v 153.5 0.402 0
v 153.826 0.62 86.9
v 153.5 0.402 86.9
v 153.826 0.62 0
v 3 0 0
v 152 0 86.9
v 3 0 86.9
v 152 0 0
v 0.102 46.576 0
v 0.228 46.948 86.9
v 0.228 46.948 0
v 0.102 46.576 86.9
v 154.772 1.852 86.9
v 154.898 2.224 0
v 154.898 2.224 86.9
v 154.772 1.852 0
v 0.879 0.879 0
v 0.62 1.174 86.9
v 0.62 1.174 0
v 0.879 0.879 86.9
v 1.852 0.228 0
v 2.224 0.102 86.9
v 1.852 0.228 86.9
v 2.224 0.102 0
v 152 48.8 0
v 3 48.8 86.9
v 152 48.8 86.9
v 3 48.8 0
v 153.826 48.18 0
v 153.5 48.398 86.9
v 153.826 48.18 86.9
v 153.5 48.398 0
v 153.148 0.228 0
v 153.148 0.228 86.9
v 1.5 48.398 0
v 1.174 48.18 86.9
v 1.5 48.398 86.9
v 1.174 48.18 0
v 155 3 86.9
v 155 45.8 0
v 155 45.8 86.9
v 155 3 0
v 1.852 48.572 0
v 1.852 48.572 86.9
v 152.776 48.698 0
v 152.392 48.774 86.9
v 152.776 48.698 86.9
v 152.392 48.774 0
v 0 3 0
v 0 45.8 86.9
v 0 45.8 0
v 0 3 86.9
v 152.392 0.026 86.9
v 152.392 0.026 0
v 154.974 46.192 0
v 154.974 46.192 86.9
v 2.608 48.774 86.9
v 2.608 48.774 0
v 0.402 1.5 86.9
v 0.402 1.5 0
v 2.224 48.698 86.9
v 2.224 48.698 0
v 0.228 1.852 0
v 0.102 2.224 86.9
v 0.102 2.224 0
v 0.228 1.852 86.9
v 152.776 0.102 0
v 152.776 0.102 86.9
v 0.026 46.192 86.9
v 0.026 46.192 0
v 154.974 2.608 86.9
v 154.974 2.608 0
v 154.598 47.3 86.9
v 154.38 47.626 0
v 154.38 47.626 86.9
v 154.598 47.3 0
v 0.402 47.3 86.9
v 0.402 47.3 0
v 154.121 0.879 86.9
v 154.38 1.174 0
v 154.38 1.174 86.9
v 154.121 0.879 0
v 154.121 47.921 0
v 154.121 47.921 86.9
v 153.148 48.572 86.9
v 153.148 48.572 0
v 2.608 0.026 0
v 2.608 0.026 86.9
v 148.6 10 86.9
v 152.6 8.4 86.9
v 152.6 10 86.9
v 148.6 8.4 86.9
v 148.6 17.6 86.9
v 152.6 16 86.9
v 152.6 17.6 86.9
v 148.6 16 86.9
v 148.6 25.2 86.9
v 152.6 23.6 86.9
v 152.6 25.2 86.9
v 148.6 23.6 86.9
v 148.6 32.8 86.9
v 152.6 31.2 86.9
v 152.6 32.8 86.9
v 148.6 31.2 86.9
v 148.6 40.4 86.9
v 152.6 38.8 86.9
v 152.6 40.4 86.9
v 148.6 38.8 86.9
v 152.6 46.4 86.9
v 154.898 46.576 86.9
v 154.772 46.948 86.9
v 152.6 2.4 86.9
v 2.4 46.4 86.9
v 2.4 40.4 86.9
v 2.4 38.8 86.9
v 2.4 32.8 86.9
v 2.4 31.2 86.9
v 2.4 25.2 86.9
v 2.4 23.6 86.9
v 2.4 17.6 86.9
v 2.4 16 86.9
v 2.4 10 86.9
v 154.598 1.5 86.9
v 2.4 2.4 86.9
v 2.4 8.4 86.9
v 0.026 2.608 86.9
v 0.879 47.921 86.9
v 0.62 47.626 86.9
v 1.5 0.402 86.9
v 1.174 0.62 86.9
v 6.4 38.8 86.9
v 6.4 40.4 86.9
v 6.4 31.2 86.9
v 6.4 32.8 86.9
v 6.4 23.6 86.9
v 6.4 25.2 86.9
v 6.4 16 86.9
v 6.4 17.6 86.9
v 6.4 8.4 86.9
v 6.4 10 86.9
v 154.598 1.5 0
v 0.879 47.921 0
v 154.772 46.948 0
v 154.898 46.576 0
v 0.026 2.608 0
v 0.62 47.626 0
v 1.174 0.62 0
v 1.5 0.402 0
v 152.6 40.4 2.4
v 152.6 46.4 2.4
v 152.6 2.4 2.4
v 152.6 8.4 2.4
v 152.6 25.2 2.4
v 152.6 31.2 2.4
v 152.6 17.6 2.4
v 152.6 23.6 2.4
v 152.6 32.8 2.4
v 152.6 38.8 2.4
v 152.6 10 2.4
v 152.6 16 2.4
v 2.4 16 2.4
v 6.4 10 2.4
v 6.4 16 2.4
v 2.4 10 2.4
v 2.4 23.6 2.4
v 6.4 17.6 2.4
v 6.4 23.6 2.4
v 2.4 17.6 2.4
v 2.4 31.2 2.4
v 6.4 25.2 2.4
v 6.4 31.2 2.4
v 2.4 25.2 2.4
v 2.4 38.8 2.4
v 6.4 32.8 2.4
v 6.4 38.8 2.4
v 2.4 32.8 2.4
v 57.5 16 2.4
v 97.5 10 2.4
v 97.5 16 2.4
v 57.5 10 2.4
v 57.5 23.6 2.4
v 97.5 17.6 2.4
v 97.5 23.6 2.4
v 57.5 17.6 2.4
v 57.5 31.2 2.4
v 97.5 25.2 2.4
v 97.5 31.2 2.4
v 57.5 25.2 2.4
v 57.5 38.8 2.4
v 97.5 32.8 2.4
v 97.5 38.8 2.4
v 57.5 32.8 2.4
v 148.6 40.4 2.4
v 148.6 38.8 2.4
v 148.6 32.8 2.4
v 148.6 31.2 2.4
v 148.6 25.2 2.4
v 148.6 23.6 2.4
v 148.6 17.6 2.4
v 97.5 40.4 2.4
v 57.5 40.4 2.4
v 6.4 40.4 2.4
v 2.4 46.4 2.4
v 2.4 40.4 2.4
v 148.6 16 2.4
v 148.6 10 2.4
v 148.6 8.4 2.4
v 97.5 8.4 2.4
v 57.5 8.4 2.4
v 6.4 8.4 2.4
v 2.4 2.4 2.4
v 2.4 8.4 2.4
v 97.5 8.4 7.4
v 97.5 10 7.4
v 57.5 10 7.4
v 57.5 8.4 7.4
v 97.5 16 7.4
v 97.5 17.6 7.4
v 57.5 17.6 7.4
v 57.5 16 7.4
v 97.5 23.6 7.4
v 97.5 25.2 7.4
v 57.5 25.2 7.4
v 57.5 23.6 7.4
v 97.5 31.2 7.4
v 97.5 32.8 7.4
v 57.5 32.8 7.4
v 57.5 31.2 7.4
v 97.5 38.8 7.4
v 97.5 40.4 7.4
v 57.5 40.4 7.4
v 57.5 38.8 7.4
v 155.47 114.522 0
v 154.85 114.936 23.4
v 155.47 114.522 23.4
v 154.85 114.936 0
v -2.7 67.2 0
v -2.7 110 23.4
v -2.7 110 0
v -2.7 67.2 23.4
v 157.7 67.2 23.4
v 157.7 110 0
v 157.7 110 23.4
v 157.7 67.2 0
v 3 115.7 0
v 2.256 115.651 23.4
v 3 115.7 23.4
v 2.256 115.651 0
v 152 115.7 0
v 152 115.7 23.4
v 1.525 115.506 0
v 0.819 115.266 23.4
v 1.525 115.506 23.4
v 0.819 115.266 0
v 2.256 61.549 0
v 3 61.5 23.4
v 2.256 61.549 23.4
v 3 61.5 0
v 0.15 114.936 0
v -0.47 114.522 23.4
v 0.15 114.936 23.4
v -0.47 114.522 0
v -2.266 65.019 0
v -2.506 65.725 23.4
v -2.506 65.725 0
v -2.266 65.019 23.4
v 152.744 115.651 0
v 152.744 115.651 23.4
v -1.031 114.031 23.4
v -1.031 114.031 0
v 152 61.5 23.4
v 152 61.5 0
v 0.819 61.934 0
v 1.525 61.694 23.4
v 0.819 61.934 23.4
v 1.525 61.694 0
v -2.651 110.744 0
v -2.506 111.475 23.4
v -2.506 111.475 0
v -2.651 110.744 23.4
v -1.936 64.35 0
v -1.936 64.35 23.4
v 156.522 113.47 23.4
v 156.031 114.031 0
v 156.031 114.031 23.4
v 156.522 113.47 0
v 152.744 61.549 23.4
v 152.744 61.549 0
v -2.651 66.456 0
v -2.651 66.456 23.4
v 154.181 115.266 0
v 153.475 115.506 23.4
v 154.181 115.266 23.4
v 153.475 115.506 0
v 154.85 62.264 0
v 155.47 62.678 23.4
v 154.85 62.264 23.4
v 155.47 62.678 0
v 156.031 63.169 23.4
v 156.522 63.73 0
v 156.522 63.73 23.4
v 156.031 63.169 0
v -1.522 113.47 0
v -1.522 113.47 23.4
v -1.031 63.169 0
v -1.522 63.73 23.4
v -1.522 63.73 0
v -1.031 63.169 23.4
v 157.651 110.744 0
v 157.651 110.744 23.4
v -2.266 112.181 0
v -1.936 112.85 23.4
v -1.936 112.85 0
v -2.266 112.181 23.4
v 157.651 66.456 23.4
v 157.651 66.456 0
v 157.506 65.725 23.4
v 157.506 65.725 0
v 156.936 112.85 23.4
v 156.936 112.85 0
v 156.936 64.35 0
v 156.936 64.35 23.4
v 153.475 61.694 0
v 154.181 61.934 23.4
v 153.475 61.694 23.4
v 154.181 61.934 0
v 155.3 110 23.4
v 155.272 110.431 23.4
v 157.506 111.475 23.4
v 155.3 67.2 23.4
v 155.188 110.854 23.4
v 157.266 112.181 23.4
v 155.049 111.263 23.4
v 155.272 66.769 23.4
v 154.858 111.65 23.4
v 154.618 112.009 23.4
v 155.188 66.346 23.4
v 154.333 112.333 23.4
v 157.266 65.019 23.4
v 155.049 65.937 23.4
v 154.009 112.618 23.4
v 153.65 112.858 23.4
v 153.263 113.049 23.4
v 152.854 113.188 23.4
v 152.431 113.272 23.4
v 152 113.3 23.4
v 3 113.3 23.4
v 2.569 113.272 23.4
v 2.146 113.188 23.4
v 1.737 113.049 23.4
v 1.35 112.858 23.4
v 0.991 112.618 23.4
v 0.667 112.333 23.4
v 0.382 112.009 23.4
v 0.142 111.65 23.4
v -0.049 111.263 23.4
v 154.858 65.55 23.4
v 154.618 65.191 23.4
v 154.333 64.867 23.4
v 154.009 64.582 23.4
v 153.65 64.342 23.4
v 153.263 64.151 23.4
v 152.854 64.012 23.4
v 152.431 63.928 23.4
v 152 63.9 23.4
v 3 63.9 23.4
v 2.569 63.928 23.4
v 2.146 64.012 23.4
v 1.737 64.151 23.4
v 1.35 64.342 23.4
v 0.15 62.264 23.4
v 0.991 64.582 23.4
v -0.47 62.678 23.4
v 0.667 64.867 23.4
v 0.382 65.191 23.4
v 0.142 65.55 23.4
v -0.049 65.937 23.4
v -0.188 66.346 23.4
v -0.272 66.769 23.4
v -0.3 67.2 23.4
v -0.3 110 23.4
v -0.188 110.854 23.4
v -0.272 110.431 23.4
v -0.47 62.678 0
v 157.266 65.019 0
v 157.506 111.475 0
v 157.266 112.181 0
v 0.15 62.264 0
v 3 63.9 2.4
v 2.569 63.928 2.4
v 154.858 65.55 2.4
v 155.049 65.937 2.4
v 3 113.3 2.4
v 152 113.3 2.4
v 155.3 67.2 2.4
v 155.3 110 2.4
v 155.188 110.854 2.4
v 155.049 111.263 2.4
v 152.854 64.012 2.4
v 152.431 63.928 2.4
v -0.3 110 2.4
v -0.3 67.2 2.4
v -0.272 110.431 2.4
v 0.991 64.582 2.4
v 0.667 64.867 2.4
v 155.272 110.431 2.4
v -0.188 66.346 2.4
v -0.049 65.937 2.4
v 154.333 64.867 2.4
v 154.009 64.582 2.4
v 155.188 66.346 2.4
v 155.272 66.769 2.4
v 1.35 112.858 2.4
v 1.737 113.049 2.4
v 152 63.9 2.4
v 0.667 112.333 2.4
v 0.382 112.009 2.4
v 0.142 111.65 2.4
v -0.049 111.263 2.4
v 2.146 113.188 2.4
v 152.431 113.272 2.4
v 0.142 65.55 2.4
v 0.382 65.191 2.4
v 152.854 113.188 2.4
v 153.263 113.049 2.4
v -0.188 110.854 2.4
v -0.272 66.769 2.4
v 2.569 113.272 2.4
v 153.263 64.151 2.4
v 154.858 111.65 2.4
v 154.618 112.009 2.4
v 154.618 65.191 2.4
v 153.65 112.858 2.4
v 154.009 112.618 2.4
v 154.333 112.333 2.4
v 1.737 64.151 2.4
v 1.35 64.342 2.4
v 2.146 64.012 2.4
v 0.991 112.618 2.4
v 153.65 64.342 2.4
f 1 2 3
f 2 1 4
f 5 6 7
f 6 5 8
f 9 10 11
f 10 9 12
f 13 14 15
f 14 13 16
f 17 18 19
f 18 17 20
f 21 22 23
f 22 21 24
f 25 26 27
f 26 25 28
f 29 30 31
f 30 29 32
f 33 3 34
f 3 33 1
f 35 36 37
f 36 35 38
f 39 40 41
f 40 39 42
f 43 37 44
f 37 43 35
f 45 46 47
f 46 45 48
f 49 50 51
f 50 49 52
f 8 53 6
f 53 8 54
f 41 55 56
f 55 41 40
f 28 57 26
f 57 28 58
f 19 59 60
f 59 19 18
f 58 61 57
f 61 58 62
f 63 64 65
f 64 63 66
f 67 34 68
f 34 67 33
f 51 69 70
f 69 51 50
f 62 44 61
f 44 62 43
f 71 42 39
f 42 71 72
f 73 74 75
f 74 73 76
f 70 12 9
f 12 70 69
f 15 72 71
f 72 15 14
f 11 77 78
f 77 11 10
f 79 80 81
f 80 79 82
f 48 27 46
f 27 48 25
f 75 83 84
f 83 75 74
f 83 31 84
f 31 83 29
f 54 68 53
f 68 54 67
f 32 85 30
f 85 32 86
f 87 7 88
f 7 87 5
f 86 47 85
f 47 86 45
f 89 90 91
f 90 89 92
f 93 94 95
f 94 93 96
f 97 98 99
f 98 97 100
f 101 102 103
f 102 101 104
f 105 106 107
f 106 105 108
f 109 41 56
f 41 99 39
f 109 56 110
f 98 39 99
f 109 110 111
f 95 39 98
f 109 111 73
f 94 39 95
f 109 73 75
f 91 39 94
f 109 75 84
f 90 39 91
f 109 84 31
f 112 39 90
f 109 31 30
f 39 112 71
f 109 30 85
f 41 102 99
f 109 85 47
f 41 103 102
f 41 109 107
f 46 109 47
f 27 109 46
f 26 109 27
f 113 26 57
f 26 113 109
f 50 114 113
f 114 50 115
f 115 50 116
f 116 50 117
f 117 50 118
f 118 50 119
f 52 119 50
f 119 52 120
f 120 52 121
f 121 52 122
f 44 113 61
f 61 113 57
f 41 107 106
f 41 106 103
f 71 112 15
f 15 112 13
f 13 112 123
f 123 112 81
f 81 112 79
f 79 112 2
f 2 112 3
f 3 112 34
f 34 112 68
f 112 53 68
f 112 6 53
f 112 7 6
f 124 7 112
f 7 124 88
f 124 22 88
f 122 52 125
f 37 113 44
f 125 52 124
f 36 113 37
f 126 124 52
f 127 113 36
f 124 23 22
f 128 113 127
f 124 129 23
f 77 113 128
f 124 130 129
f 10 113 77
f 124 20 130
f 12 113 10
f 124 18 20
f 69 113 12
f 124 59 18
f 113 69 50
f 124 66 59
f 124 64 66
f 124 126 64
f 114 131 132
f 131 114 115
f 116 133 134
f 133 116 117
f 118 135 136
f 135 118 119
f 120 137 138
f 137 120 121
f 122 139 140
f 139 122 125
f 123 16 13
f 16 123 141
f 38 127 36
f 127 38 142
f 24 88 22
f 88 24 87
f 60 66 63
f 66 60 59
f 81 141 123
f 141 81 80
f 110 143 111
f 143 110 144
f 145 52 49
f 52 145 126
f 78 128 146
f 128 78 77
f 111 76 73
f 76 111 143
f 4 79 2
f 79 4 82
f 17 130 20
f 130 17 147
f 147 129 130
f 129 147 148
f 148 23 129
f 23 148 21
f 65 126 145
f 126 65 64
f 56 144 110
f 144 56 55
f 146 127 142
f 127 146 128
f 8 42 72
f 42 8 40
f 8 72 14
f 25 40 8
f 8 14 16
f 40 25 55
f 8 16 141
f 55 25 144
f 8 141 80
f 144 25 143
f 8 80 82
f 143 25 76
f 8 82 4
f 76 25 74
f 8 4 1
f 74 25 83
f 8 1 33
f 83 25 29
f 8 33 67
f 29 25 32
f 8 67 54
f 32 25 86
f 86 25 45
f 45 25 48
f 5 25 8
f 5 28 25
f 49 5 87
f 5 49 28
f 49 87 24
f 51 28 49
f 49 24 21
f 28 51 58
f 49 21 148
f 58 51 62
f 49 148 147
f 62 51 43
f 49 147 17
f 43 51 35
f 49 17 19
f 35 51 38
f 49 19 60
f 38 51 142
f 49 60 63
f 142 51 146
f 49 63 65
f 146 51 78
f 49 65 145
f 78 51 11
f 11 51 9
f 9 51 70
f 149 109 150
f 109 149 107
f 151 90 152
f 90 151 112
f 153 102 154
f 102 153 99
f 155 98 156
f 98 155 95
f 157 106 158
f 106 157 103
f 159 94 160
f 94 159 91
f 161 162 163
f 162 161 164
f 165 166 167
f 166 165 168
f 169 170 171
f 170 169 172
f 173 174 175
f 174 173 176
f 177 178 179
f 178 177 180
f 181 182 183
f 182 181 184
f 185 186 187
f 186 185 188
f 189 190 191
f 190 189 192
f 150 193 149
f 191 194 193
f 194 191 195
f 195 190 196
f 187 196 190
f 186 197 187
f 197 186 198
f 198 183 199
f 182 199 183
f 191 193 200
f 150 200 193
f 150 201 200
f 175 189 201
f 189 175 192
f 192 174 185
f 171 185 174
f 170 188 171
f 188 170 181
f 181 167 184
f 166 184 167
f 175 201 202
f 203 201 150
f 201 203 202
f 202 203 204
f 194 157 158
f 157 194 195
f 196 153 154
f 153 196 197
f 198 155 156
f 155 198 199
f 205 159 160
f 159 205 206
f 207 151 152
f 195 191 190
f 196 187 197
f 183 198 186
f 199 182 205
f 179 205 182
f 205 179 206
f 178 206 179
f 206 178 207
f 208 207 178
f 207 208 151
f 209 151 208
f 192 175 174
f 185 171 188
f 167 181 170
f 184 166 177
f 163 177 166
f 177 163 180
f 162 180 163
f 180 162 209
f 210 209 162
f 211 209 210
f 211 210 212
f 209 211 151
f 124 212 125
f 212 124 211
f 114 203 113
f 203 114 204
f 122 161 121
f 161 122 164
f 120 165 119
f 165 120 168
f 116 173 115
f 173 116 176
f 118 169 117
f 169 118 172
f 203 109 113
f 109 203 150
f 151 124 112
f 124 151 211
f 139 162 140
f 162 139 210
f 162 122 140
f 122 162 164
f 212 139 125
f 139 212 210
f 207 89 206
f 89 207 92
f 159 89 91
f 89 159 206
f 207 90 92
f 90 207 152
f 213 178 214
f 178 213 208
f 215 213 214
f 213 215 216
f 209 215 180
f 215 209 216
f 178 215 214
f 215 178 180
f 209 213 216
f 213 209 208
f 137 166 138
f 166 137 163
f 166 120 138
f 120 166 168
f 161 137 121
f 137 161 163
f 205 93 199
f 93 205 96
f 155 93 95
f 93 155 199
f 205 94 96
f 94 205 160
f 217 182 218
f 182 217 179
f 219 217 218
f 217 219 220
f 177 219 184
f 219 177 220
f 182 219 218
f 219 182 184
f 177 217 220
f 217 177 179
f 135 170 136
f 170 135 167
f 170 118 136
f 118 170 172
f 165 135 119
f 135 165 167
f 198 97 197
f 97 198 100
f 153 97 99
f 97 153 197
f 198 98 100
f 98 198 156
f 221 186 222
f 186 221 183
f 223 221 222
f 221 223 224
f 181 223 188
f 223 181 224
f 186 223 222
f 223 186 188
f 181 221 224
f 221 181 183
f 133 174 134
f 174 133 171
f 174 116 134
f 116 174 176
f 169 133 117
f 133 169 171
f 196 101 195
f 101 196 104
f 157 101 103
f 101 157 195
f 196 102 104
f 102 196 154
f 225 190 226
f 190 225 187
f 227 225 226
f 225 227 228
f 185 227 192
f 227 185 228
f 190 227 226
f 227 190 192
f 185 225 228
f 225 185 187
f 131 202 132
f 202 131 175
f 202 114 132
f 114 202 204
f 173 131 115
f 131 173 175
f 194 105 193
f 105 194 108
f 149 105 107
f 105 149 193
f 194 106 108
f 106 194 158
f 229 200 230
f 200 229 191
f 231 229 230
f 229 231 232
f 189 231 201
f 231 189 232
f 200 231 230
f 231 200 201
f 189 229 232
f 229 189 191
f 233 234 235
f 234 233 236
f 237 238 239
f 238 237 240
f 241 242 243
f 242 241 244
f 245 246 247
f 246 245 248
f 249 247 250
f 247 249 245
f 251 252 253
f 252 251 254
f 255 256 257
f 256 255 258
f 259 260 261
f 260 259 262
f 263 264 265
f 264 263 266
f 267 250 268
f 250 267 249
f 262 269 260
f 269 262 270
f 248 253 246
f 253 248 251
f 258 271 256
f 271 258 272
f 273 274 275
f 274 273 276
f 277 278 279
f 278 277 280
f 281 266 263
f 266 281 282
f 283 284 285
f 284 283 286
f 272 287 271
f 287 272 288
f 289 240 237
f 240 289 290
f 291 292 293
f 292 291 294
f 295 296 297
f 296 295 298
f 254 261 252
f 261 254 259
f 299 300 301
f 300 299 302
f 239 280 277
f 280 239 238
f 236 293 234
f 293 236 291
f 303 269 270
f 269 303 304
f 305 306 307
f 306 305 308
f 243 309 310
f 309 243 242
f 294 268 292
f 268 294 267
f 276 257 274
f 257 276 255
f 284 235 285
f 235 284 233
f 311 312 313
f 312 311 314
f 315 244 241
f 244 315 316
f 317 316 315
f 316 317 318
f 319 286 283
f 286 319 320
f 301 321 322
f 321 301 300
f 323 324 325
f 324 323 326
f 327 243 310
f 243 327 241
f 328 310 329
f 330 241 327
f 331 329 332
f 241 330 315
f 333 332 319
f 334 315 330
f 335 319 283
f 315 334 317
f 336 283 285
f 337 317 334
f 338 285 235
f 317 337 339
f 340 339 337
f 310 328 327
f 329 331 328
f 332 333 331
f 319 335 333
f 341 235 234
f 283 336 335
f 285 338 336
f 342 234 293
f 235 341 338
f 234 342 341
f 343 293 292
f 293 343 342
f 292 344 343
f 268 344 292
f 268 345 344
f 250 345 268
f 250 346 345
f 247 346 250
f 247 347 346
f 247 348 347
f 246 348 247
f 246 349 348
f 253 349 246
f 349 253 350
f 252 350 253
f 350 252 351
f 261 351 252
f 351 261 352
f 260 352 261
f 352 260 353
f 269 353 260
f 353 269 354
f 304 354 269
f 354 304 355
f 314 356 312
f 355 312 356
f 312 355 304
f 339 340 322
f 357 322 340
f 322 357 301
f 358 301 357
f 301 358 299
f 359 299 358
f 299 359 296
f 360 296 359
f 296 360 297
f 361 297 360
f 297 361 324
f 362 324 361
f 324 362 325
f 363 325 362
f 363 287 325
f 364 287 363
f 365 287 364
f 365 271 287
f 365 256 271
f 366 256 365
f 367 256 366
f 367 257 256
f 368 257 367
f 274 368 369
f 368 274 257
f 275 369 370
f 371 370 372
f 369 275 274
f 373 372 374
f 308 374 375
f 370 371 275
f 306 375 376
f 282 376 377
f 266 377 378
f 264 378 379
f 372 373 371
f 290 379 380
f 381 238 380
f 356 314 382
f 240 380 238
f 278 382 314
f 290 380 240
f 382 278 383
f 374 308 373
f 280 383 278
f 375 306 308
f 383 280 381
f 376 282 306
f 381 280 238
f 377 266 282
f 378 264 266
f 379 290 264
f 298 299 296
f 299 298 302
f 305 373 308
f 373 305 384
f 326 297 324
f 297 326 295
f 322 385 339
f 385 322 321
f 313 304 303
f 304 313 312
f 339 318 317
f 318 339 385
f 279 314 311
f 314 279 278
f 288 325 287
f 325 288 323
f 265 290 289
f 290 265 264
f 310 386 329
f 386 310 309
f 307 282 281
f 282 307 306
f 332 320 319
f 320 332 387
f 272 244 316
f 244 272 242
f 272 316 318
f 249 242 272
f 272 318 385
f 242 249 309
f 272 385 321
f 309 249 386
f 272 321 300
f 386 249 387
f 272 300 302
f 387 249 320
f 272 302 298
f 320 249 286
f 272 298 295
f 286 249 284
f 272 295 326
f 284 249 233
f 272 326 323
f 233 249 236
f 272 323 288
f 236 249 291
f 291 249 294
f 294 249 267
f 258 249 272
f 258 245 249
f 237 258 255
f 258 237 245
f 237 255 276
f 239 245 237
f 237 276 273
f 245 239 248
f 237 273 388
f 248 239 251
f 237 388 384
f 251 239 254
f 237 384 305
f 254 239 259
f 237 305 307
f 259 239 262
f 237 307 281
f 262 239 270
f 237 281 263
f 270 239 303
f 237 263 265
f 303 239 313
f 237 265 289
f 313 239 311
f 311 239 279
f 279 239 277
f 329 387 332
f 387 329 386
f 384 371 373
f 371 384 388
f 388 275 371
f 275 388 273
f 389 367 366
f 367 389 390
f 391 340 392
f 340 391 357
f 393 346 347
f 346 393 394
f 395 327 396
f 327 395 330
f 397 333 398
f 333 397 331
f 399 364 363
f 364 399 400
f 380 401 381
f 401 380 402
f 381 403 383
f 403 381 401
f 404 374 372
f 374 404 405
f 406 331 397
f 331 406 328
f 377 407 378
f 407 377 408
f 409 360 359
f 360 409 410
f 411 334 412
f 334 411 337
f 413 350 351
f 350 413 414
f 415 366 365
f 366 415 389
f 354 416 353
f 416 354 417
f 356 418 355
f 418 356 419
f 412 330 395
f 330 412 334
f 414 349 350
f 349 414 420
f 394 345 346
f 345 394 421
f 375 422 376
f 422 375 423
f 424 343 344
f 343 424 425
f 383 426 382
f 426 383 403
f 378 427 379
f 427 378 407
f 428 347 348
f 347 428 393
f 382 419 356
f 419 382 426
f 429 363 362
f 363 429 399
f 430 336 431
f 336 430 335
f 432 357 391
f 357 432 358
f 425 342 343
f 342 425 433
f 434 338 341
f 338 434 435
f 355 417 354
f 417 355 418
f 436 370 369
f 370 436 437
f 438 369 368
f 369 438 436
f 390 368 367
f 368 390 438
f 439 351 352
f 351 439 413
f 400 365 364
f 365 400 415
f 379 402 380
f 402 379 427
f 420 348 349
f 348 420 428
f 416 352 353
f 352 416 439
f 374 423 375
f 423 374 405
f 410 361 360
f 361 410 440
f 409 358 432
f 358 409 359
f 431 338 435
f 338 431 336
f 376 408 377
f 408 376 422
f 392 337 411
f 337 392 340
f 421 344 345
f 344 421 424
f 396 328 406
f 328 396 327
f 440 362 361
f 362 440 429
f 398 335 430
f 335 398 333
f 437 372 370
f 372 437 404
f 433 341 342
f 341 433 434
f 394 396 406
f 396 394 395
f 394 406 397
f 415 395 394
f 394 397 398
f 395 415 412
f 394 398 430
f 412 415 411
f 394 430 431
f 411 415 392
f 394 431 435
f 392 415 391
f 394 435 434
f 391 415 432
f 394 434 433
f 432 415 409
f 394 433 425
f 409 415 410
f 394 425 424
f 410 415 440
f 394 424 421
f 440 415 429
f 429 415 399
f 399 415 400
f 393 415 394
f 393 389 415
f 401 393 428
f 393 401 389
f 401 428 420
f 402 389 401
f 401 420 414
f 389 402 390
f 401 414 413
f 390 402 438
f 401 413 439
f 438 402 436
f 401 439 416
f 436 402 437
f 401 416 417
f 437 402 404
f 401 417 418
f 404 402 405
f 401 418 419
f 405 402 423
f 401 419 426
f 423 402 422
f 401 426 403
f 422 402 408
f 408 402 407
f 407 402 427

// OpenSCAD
// =====================================================================
//  Caja con guías internas y tapa para 6 paneles "nfc_panel_blank"
//  Medidas de la pieza (extraídas del STL): 149 x 94.5 x 5 mm
//    ancho (X) = 149   alto (Z) = 94.5   grosor (Y) = 5
//
//  Las piezas se guardan de canto (de pie), una detrás de otra,
//  cada una en su ranura. Sobresalen por arriba para poder cogerlas
//  y la tapa es una "funda" que se desliza por fuera de la caja.
//
//  Material: PETG (ver docs/14_Caja_Paneles_NFC.md). Si la tapa queda
//  dura, sube lid_clr a 0.4.
//  Impresión (sin soportes):
//    - Caja: base apoyada en la cama.
//    - Tapa: se imprime boca abajo (ya viene girada en part="print").
// =====================================================================

/* [Qué mostrar] */
// print = caja + tapa listas para imprimir | box | lid | assembly = montada
part = "print";   // [print, box, lid, assembly]
// Muestra las piezas de ejemplo (bloques) dentro de la caja
show_pieces = true;

/* [Pieza a guardar] */
piece_w = 149;    // ancho (X)
piece_h = 94.5;   // alto (Z)
piece_t = 5;      // grosor (Y)
n_pieces = 6;     // número de piezas

/* [Holguras] */
clr_x = 0.6;      // holgura lateral por lado
clr_t = 1.0;      // holgura extra en cada ranura (grosor)
lid_clr = 0.3;    // holgura tapa/caja por lado (sube a 0.4 si queda dura)

/* [Caja] */
wall = 2.4;       // grosor de paredes
floor_t = 2.4;    // grosor del suelo
rib_t = 1.6;      // grosor de cada guía (separador entre piezas)
rib_depth = 4;    // cuánto entran las guías desde la pared lateral
floor_rib_len = 40;  // largo de las guías del suelo (0 = sin guías de suelo)
floor_rib_h = 5;     // altura de las guías del suelo
sticks_out = 10;  // cuánto sobresalen las piezas por encima de la caja
corner_r = 3;     // radio de esquinas exteriores

/* [Tapa] */
lid_wall = 2.4;   // grosor paredes de la tapa
lid_top = 2.4;    // grosor de la cara superior
lid_overlap = 10; // cuánto cubre la tapa las paredes de la caja
lid_gap = 1;      // aire entre las piezas y la tapa

$fn = 48;

// ------------------------- cálculos -------------------------
slot_w  = piece_t + clr_t;                          // ancho de cada ranura
in_x    = piece_w + 2*clr_x;                        // interior X
in_y    = n_pieces*slot_w + (n_pieces-1)*rib_t;     // interior Y
in_h    = piece_h - sticks_out;                     // interior Z útil
ox      = in_x + 2*wall;                            // exterior X
oy      = in_y + 2*wall;                            // exterior Y
box_h   = floor_t + in_h;                           // altura de la caja

lid_ix  = ox + 2*lid_clr;                           // interior tapa
lid_iy  = oy + 2*lid_clr;
lid_ox  = lid_ix + 2*lid_wall;
lid_oy  = lid_iy + 2*lid_wall;
lid_in_depth = lid_overlap + sticks_out + lid_gap;  // fondo interior tapa
lid_h   = lid_in_depth + lid_top;

assert(sticks_out < piece_h, "sticks_out debe ser menor que el alto de la pieza");

// ------------------------- módulos -------------------------
module rounded_block(x, y, h, r) {
    hull()
        for (i = [r, x-r], j = [r, y-r])
            translate([i, j, 0]) cylinder(r = r, h = h);
}

// Posición Y del inicio de la ranura k (0..n-1)
function slot_y(k) = wall + k*(slot_w + rib_t);

module box() {
    difference() {
        rounded_block(ox, oy, box_h, corner_r);
        translate([wall, wall, floor_t]) cube([in_x, in_y, in_h + 1]);
    }
    // Guías: un separador entre cada par de ranuras
    for (k = [1 : n_pieces-1]) {
        y = slot_y(k) - rib_t;
        // laterales (altura completa)
        translate([wall - 0.01, y, floor_t - 0.01])
            cube([rib_depth + 0.01, rib_t, in_h + 0.01]);
        translate([ox - wall - rib_depth, y, floor_t - 0.01])
            cube([rib_depth + 0.01, rib_t, in_h + 0.01]);
        // suelo
        if (floor_rib_len > 0)
            translate([ox/2 - floor_rib_len/2, y, floor_t - 0.01])
                cube([floor_rib_len, rib_t, floor_rib_h + 0.01]);
    }
}

// Tapa en posición natural (abierta hacia abajo, cara superior arriba)
module lid_body() {
    difference() {
        rounded_block(lid_ox, lid_oy, lid_h, corner_r + lid_clr + lid_wall);
        translate([lid_wall, lid_wall, -0.01])
            rounded_block(lid_ix, lid_iy, lid_in_depth + 0.01, corner_r + lid_clr);
    }
}

module pieces_preview() {
    color("orange", 0.8)
    for (k = [0 : n_pieces-1])
        translate([ox/2 - piece_w/2, slot_y(k) + clr_t/2, floor_t])
            cube([piece_w, piece_t, piece_h]);
}

// ------------------------- salida -------------------------
if (part == "box") {
    box();
} else if (part == "lid") {
    // tapa boca abajo, lista para imprimir
    translate([0, lid_oy, lid_h]) rotate([180, 0, 0]) lid_body();
} else if (part == "assembly") {
    color("steelblue") box();
    if (show_pieces) pieces_preview();
    color("lightgray", 0.6)
        translate([-(lid_clr + lid_wall), -(lid_clr + lid_wall), box_h - lid_overlap])
            lid_body();
} else {
    // print: caja y tapa una al lado de otra (en Y para caber en camas pequeñas)
    box();
    translate([-(lid_clr + lid_wall), oy + 10 + (lid_clr + lid_wall), 0])
        translate([0, lid_oy, lid_h]) rotate([180, 0, 0]) lid_body();
}

echo(str("Caja exterior: ", ox, " x ", oy, " x ", box_h, " mm"));
echo(str("Tapa exterior: ", lid_ox, " x ", lid_oy, " x ", lid_h, " mm"));
echo(str("Hueco por ranura: ", slot_w, " mm (pieza ", piece_t, " mm)"));
